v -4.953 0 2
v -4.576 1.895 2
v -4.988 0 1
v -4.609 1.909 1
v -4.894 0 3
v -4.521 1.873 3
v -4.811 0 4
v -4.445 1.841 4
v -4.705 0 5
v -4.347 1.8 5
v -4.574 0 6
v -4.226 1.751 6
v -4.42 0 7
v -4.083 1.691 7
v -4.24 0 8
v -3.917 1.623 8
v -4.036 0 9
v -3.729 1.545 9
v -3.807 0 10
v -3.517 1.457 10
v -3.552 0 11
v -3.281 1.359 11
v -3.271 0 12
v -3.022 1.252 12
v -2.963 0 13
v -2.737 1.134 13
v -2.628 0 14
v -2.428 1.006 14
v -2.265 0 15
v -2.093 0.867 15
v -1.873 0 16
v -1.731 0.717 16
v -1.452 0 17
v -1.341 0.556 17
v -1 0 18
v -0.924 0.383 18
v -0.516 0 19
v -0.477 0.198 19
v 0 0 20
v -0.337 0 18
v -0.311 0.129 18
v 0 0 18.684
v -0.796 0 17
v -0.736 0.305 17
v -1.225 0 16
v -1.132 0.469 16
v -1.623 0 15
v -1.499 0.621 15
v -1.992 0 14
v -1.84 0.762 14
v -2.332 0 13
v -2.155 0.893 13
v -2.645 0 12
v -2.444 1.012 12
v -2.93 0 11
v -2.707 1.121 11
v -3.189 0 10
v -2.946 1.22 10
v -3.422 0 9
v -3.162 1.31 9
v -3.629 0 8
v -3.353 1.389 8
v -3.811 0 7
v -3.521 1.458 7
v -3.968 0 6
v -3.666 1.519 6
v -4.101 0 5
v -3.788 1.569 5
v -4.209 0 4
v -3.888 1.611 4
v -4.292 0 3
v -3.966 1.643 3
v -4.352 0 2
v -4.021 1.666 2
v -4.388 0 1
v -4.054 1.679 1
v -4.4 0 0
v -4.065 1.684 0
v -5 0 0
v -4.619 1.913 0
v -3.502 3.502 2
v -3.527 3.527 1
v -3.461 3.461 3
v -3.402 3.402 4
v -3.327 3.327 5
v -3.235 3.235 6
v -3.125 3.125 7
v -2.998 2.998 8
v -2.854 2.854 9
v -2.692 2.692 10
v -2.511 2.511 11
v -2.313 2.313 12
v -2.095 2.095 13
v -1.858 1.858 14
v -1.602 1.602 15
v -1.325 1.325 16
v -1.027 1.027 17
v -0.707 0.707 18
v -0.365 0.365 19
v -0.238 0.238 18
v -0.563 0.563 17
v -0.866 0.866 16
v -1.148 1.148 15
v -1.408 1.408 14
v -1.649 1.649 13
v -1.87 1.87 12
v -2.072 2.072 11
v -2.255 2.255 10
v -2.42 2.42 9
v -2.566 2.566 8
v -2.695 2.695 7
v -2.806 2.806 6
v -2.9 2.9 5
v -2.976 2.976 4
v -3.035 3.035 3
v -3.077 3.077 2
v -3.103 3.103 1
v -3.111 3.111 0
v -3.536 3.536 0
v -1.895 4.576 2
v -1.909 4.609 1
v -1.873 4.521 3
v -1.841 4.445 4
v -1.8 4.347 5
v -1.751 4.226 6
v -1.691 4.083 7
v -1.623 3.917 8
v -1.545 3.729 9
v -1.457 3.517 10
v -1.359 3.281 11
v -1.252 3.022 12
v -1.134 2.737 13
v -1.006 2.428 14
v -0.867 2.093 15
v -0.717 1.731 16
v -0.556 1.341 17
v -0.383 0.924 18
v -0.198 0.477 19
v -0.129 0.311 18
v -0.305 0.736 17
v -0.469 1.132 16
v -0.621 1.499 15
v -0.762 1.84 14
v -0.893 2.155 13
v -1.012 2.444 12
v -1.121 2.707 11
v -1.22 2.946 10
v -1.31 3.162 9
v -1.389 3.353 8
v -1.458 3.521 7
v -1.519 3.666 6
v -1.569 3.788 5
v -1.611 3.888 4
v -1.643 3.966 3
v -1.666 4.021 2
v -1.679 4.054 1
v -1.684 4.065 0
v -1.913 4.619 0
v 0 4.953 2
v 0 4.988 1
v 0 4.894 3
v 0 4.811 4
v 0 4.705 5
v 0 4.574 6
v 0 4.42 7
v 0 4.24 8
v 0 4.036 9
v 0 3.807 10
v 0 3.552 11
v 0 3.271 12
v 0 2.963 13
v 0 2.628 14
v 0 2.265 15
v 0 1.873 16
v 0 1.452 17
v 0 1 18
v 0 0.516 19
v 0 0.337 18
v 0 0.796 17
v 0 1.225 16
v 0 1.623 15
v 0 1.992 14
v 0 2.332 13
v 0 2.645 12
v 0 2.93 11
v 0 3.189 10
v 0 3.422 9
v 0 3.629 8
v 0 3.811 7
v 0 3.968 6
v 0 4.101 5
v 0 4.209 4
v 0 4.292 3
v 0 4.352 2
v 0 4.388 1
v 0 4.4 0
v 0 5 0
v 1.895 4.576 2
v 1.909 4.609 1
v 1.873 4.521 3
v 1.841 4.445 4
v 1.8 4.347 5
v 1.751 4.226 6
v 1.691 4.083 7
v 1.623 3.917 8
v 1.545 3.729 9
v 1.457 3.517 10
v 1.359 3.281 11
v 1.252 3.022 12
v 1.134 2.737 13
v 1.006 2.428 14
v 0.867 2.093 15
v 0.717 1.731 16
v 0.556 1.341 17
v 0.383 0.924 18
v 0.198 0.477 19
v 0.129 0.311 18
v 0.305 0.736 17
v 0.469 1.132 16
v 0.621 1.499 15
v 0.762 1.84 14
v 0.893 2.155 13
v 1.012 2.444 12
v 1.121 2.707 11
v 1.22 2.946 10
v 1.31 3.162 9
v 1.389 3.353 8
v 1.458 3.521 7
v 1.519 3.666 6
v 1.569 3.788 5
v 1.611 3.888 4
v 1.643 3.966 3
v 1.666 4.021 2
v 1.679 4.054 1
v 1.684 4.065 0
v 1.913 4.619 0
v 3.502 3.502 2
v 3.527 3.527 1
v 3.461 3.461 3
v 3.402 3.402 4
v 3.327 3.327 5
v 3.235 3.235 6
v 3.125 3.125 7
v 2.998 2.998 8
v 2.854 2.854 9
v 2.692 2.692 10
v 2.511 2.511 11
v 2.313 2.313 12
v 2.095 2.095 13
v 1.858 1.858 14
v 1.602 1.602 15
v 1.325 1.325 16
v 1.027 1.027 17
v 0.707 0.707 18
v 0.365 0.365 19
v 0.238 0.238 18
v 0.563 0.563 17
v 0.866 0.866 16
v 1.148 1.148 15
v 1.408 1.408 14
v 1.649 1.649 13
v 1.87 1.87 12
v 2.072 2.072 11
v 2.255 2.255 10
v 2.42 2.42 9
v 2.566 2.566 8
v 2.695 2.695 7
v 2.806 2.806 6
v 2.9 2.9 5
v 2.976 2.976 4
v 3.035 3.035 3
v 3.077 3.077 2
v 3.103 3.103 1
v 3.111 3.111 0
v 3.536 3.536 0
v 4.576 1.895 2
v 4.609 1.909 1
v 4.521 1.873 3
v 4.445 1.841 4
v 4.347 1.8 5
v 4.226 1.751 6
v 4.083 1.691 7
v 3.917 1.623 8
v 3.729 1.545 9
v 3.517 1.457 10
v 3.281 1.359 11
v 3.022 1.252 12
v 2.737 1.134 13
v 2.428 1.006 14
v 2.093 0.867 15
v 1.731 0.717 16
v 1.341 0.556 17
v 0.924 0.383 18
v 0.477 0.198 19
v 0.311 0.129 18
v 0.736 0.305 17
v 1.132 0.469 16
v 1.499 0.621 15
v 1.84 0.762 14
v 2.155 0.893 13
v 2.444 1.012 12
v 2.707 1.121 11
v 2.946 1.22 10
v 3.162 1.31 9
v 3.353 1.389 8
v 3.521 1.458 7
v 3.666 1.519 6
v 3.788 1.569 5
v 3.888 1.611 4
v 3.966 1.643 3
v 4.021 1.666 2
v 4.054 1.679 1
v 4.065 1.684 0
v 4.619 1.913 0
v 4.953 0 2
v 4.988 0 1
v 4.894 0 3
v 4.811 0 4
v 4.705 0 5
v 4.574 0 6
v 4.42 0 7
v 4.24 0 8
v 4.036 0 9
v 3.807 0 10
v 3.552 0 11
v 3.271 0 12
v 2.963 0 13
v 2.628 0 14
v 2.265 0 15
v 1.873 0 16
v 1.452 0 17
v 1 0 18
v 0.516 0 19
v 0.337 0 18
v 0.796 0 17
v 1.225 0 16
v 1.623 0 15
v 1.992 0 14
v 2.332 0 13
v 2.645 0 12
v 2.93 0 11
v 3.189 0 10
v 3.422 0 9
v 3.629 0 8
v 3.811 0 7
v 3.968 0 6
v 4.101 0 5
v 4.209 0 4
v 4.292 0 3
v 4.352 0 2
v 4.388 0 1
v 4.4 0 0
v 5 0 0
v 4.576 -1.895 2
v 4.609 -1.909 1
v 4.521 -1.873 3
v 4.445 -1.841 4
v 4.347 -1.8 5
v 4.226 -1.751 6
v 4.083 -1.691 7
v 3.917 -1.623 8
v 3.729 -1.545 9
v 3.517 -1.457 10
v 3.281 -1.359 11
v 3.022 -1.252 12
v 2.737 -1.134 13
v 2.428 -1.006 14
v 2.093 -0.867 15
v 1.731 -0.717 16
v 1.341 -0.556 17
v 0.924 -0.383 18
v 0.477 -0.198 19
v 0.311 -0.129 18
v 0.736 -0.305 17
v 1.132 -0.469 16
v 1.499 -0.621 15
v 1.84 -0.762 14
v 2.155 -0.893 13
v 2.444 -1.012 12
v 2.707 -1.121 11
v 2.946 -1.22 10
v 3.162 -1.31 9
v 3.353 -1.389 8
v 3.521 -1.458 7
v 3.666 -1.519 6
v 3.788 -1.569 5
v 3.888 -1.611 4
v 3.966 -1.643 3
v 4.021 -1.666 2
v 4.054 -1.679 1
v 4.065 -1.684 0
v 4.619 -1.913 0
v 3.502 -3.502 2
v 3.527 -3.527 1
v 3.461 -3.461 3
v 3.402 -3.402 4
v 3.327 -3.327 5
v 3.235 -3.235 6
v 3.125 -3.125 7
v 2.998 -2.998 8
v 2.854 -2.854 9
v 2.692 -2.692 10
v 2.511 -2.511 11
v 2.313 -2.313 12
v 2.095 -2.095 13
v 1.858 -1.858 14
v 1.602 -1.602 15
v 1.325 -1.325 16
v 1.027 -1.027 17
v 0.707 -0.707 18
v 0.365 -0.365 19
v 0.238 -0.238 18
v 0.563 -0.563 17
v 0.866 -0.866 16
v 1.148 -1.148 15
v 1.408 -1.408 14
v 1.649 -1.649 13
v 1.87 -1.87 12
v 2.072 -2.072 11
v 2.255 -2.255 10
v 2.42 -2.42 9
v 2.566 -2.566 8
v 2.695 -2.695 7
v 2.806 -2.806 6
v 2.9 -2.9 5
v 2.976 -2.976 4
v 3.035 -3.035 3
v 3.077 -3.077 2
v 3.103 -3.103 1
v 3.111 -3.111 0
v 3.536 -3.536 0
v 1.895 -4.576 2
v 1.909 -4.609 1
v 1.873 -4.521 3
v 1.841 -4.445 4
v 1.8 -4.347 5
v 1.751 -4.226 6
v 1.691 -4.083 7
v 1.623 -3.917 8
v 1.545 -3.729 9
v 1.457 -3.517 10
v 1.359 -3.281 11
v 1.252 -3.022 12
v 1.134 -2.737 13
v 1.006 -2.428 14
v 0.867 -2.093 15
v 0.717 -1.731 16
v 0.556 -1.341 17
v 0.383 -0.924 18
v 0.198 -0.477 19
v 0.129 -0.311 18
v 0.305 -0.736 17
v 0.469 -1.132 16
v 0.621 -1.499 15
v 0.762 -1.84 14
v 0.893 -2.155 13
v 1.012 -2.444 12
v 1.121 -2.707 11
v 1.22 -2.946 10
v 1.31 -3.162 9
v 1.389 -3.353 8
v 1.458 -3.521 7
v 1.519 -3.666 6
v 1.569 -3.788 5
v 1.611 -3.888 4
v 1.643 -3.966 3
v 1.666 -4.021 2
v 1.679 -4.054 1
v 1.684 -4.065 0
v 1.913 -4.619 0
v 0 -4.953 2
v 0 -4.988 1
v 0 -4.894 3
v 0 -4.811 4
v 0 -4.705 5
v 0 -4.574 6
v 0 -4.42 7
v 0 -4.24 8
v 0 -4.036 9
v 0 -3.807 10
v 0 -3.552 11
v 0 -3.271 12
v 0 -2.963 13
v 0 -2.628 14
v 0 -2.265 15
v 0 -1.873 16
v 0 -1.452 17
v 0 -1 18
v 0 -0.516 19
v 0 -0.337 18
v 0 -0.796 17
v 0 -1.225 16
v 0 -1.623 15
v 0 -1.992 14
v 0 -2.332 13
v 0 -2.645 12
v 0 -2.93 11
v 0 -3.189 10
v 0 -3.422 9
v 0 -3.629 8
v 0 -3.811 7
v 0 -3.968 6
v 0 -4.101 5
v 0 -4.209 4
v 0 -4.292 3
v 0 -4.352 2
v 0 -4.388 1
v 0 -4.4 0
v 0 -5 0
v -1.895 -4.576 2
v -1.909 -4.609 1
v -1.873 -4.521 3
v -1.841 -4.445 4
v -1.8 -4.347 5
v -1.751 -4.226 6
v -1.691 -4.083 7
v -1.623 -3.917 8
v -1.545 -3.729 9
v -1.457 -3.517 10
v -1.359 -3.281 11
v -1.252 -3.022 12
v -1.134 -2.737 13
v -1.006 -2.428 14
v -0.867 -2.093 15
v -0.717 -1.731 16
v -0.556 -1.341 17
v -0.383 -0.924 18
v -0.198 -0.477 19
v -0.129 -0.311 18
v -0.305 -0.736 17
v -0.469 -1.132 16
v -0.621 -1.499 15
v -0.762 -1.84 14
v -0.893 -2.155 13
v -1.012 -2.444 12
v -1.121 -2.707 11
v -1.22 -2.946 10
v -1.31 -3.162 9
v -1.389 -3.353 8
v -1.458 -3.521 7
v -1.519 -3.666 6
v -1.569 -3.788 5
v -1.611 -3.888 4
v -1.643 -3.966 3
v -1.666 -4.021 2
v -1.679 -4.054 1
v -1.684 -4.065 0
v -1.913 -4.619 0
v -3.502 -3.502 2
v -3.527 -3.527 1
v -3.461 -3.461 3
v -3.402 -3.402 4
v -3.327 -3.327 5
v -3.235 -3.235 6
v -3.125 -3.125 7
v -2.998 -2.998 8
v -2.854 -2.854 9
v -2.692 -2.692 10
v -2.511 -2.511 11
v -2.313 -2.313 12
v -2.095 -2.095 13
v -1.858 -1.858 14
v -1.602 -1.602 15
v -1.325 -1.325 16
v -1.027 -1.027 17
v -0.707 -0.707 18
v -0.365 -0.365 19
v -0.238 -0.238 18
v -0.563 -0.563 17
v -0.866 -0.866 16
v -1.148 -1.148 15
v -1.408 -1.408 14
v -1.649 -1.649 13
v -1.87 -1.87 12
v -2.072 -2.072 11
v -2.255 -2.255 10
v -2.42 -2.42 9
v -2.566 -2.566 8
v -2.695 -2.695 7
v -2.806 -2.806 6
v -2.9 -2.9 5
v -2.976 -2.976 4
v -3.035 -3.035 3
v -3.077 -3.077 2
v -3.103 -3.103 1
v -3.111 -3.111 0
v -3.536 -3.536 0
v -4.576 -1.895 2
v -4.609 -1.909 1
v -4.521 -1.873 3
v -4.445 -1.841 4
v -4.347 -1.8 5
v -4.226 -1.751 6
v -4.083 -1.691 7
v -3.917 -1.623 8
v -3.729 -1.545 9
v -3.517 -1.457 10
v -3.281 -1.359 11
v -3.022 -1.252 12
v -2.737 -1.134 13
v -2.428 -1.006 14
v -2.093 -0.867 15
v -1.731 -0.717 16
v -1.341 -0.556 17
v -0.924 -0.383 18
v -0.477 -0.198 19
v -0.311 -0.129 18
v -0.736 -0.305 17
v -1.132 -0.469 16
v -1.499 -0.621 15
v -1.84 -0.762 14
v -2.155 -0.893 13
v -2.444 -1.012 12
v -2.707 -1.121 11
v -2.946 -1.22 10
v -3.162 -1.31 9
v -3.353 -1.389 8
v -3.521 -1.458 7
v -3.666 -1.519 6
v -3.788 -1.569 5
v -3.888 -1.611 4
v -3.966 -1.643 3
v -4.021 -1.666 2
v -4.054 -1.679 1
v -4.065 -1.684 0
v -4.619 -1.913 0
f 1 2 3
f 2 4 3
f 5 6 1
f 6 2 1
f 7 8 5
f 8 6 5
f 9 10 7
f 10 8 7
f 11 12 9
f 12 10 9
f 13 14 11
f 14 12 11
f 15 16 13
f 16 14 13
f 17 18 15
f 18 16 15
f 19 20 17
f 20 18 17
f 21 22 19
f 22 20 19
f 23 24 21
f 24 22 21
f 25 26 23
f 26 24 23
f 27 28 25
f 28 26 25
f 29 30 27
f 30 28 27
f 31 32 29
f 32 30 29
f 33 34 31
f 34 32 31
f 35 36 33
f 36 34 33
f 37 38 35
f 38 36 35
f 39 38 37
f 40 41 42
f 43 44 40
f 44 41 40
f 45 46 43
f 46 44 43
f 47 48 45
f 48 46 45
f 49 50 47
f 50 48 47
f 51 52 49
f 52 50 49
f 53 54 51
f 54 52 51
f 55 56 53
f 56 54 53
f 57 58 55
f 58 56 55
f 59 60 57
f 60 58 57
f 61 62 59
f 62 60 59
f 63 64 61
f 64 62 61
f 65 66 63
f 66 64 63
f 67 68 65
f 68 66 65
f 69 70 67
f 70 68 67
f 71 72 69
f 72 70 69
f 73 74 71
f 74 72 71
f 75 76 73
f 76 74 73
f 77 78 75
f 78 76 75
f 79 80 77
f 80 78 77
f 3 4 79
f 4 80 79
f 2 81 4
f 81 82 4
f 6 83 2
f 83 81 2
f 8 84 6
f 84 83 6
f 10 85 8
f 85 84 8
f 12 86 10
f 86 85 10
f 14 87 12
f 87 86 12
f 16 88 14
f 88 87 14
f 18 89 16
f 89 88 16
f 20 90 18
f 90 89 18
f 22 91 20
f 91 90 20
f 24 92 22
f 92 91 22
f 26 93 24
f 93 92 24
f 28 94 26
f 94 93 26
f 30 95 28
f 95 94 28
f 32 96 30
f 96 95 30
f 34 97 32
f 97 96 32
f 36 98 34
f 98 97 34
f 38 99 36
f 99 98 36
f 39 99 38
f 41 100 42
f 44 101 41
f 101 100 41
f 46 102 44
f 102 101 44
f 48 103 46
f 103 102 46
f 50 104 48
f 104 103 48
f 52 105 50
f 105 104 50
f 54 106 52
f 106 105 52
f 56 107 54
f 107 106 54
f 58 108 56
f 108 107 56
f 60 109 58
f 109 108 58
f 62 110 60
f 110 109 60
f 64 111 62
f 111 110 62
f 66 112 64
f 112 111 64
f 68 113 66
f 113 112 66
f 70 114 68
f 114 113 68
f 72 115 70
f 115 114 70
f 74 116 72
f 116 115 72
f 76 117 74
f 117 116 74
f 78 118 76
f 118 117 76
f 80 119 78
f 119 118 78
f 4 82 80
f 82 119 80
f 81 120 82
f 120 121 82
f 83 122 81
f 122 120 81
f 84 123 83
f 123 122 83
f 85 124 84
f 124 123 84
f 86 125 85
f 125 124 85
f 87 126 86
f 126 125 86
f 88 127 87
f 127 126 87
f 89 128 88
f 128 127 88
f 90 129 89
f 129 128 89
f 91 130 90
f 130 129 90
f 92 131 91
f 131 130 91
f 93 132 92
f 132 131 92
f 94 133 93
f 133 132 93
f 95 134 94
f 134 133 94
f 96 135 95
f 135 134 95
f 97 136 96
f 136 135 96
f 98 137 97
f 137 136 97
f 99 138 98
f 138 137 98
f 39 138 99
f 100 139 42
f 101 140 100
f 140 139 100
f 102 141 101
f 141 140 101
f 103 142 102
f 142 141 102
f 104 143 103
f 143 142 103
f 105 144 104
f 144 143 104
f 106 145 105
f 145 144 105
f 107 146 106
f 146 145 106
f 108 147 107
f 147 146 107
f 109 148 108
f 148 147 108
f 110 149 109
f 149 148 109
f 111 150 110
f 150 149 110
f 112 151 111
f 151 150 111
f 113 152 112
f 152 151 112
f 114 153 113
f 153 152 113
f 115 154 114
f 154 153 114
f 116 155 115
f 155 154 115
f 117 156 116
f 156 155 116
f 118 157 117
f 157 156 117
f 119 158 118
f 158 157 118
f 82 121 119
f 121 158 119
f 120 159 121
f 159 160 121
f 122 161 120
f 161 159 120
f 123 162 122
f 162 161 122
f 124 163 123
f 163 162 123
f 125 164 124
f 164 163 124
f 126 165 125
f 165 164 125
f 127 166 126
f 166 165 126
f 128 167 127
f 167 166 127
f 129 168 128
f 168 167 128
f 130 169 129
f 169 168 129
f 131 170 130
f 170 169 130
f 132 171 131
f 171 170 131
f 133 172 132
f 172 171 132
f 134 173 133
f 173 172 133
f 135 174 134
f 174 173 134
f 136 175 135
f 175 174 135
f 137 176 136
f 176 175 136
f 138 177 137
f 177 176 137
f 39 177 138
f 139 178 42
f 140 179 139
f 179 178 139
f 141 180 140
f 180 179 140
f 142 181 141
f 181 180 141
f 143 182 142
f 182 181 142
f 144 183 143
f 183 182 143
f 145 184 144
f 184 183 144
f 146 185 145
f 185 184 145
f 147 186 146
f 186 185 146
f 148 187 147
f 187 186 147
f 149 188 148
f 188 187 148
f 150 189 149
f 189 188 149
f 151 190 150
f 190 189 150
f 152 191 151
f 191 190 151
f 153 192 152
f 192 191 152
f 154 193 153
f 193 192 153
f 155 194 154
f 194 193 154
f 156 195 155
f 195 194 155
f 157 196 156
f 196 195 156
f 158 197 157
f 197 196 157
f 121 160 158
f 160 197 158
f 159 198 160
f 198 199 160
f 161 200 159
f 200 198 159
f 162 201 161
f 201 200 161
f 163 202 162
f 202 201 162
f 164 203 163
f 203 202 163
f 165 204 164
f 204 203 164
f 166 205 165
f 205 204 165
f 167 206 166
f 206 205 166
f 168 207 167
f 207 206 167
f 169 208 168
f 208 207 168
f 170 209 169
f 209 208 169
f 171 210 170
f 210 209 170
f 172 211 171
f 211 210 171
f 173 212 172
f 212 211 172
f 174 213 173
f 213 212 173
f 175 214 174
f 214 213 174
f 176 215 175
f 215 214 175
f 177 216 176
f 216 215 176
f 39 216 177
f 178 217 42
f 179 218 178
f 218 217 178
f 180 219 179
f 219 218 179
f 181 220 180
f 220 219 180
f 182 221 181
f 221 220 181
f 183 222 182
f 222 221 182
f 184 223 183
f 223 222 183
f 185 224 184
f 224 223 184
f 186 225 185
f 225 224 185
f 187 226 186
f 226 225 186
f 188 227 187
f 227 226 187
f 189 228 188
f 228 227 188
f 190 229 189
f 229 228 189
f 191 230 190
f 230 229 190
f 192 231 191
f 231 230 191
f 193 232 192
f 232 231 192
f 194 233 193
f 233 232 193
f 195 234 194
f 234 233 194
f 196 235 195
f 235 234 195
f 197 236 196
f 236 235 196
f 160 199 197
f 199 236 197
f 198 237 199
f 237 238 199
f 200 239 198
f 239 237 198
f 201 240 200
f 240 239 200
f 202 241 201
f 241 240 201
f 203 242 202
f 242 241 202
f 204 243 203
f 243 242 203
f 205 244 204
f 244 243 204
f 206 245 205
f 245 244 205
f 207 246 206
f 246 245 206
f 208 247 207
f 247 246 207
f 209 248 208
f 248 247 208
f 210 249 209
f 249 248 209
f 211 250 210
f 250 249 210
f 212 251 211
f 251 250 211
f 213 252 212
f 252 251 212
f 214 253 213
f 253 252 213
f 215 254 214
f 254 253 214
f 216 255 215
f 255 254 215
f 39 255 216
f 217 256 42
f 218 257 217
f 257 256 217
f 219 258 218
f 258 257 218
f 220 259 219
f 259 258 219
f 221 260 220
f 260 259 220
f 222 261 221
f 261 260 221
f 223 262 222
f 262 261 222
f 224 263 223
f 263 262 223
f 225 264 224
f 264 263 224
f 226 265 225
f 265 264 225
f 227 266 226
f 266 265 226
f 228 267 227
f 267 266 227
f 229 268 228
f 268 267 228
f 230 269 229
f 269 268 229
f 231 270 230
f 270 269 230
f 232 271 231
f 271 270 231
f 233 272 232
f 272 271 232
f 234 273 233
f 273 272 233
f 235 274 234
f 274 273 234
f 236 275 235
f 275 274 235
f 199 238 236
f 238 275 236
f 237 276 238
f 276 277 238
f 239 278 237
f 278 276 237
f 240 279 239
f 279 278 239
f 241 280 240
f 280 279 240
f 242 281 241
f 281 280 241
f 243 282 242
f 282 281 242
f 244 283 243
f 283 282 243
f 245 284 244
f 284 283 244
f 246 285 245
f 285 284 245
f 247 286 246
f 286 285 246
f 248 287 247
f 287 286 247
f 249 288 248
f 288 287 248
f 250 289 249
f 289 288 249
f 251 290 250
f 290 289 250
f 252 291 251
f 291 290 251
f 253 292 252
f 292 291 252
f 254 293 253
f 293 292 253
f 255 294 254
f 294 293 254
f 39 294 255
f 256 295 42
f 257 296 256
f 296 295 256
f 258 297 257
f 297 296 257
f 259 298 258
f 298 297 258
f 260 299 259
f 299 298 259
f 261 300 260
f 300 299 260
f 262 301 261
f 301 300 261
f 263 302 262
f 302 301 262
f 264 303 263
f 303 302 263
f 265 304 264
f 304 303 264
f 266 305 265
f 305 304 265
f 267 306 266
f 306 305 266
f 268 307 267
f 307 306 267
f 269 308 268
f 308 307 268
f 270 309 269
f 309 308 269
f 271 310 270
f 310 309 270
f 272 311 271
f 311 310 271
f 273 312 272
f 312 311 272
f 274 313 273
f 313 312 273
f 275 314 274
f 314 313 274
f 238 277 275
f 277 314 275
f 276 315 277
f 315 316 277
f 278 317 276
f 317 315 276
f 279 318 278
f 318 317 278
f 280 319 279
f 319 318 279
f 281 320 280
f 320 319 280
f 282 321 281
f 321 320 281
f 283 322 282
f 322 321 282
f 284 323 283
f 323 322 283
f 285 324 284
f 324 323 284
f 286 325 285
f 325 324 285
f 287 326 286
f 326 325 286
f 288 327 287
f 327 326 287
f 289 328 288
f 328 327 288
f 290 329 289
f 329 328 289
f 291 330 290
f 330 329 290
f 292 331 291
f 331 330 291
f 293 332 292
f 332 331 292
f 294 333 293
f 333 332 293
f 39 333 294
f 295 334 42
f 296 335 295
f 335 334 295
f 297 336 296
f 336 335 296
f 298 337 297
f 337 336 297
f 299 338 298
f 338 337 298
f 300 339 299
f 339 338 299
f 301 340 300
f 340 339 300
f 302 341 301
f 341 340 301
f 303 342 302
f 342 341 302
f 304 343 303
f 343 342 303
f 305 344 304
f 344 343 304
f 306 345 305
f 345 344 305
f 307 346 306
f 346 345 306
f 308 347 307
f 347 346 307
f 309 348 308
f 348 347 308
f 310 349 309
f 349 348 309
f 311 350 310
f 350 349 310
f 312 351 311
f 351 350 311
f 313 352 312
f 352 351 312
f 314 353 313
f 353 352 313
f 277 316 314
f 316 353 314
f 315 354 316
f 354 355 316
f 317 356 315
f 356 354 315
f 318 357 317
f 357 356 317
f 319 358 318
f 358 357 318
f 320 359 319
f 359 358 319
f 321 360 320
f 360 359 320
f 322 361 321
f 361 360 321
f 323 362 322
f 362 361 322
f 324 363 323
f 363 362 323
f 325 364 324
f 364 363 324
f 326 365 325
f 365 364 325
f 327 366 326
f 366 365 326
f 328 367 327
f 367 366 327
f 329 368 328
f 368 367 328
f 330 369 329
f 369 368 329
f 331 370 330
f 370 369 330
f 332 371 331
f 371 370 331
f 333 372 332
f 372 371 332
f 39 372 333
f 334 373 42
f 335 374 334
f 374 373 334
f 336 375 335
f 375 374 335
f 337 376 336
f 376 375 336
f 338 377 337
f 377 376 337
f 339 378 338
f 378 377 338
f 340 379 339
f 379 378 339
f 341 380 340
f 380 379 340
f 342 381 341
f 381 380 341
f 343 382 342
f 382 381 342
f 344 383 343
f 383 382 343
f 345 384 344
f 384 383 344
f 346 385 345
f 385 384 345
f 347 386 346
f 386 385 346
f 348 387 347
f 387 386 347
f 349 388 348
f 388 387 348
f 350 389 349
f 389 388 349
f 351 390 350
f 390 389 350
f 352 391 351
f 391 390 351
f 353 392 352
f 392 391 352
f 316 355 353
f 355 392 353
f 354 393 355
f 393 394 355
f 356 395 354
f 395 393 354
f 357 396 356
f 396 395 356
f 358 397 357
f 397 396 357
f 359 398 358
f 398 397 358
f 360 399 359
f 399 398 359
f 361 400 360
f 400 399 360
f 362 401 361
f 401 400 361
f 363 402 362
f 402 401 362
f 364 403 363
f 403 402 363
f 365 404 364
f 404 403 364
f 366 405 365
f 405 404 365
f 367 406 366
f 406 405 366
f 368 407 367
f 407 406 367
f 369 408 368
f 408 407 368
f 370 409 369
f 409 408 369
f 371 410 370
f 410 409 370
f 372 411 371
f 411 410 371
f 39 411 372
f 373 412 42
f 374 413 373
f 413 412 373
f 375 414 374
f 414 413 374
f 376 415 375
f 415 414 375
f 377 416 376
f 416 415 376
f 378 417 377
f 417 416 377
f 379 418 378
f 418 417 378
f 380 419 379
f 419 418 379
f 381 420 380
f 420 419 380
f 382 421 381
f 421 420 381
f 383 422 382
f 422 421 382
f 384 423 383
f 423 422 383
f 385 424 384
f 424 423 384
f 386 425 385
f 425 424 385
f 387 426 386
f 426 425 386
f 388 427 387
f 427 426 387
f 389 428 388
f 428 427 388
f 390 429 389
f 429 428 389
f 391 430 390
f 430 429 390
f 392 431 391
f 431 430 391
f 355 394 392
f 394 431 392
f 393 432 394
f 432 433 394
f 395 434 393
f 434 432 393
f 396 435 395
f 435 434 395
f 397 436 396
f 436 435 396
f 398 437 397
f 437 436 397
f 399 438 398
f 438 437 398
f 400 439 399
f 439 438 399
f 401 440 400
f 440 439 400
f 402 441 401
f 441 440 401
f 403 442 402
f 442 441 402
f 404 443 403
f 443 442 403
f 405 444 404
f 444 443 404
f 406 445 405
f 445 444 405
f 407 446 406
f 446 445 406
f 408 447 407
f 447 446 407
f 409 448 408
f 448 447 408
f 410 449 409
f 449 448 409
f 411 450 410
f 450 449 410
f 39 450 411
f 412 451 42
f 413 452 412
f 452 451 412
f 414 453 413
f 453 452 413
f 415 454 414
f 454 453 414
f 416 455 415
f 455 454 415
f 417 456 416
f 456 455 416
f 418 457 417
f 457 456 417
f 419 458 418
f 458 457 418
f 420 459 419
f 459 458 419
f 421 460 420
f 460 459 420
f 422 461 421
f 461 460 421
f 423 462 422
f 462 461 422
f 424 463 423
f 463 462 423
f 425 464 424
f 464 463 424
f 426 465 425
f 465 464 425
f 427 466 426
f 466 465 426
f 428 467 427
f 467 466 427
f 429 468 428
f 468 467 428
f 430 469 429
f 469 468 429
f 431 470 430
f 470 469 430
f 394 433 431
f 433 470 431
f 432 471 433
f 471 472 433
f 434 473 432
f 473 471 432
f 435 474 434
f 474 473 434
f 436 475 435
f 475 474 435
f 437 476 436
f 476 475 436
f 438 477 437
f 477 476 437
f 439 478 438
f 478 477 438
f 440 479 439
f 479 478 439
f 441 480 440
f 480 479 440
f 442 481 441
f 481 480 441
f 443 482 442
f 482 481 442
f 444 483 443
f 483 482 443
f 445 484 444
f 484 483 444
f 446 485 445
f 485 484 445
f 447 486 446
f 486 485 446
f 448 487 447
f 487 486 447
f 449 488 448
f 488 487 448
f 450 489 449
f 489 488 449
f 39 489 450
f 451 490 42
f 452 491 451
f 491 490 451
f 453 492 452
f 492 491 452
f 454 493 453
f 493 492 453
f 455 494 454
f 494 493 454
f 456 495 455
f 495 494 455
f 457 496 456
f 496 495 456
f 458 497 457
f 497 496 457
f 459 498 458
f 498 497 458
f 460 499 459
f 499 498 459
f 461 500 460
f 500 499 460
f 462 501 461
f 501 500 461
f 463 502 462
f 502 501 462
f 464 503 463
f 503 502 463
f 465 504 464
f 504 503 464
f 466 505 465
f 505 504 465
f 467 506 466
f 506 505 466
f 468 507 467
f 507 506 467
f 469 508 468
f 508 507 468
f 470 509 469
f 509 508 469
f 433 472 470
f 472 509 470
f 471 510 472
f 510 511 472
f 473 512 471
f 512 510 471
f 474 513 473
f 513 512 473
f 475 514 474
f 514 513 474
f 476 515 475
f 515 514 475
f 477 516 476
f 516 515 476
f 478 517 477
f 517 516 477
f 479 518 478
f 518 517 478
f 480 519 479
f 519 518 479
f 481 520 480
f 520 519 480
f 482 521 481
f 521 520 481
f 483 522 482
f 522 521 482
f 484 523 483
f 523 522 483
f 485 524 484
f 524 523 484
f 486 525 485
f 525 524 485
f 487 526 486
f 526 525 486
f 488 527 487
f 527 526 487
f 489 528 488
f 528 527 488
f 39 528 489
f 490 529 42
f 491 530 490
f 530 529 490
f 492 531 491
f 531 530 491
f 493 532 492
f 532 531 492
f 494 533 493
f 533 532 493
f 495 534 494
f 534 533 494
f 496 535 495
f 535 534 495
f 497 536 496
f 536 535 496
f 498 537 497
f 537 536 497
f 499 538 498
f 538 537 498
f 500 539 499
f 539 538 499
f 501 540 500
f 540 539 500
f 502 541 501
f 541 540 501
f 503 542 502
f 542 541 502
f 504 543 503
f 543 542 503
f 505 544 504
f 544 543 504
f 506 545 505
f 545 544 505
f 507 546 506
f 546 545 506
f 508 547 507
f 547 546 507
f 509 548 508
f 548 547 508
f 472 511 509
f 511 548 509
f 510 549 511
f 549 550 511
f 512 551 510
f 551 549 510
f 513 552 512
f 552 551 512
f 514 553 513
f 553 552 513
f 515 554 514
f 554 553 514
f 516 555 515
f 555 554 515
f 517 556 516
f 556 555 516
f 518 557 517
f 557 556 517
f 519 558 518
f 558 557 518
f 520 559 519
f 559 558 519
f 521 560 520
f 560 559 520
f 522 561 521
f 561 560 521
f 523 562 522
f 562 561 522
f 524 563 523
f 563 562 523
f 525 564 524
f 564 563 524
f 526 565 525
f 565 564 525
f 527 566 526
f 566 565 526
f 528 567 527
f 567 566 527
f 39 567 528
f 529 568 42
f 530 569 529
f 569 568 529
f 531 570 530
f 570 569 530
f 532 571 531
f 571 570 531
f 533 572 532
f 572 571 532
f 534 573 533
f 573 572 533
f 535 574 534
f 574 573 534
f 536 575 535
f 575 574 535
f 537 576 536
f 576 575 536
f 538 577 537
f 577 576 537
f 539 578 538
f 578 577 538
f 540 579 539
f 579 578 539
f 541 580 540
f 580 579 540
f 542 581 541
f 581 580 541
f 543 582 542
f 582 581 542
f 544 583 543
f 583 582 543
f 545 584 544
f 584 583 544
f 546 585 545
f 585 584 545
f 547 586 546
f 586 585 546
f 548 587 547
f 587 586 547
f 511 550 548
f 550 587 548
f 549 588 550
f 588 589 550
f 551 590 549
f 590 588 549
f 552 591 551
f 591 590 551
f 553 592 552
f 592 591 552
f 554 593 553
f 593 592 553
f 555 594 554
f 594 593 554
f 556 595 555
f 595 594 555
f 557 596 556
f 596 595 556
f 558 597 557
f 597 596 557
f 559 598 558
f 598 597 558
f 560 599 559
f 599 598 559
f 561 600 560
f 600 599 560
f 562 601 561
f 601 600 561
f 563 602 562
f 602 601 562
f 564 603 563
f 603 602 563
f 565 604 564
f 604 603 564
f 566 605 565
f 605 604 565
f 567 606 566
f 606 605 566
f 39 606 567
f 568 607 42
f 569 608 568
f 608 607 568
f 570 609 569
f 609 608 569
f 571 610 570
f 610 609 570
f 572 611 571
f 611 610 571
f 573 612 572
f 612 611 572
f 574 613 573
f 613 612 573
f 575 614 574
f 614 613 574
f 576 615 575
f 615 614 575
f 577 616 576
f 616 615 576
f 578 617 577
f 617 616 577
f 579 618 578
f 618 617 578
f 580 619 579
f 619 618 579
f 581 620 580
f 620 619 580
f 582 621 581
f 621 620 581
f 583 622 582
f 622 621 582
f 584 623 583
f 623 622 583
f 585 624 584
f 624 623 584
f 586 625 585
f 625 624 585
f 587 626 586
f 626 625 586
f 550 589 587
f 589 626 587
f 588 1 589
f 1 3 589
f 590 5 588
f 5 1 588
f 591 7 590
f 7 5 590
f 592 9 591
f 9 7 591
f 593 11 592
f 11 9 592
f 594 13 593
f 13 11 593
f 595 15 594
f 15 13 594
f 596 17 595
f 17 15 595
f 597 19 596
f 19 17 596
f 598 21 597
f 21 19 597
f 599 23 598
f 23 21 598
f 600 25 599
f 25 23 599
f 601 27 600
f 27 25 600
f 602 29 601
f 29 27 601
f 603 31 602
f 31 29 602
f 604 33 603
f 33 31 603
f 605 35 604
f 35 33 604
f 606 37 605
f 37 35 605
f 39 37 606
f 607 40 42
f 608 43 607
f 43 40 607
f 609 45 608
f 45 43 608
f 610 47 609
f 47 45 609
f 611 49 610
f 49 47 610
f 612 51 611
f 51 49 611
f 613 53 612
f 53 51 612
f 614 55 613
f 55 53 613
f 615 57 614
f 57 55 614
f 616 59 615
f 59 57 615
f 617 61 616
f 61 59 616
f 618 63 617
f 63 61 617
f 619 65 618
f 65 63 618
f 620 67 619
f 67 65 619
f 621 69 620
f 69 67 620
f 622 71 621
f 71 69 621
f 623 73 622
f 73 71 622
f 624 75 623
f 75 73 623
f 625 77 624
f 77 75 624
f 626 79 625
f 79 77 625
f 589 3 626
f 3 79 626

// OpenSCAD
function sq(x) = x * x;


module ogive(height, width, slices = 10, thickness = -1) {
    radius = (height * height + width * width) / (2 * width);
    
    center_x = -radius + width;
    center_y = 0;
    
    d = height / slices;
    
    echo("radius = ", radius);
    echo("d = ", d);
    
    function w(y, r) = center_x + sqrt(
        (r * r) - (y * y)
    );
    
    difference () {
        polygon(
            points = concat([
                [0, height],
                [0, 0],
                [width, 0]
            ],
            [ for (i = [0 : (slices - 1)]) [w(i * d, radius), i * d] ]),
            paths = [ [ for (i = [0 : (slices + 2)]) i ] ]
        );
        
        if (thickness > 0) {
            polygon(
                points = concat([
                    [0, sqrt(sq(radius - thickness) - sq(radius - width))],
                    [0, 0],
                    [width - thickness, 0]
                ],
                [ for (i = [0 : (slices - 1)]) [w(i * d, radius - thickness), i * d] ]),
                paths = [ [ for (i = [0 : (slices + 2)]) i ] ]
            );
        }
    }
}


module ogive_nose_cone(radius, height, slices = 10, thickness = -1) {
    rotate_extrude ()
    ogive(radius, height, slices = slices, thickness = thickness);
}


//ogive(200, 50, slices = 5, thickness = 5);
ogive_nose_cone(20, 5, slices = 20, thickness = 0.6);
